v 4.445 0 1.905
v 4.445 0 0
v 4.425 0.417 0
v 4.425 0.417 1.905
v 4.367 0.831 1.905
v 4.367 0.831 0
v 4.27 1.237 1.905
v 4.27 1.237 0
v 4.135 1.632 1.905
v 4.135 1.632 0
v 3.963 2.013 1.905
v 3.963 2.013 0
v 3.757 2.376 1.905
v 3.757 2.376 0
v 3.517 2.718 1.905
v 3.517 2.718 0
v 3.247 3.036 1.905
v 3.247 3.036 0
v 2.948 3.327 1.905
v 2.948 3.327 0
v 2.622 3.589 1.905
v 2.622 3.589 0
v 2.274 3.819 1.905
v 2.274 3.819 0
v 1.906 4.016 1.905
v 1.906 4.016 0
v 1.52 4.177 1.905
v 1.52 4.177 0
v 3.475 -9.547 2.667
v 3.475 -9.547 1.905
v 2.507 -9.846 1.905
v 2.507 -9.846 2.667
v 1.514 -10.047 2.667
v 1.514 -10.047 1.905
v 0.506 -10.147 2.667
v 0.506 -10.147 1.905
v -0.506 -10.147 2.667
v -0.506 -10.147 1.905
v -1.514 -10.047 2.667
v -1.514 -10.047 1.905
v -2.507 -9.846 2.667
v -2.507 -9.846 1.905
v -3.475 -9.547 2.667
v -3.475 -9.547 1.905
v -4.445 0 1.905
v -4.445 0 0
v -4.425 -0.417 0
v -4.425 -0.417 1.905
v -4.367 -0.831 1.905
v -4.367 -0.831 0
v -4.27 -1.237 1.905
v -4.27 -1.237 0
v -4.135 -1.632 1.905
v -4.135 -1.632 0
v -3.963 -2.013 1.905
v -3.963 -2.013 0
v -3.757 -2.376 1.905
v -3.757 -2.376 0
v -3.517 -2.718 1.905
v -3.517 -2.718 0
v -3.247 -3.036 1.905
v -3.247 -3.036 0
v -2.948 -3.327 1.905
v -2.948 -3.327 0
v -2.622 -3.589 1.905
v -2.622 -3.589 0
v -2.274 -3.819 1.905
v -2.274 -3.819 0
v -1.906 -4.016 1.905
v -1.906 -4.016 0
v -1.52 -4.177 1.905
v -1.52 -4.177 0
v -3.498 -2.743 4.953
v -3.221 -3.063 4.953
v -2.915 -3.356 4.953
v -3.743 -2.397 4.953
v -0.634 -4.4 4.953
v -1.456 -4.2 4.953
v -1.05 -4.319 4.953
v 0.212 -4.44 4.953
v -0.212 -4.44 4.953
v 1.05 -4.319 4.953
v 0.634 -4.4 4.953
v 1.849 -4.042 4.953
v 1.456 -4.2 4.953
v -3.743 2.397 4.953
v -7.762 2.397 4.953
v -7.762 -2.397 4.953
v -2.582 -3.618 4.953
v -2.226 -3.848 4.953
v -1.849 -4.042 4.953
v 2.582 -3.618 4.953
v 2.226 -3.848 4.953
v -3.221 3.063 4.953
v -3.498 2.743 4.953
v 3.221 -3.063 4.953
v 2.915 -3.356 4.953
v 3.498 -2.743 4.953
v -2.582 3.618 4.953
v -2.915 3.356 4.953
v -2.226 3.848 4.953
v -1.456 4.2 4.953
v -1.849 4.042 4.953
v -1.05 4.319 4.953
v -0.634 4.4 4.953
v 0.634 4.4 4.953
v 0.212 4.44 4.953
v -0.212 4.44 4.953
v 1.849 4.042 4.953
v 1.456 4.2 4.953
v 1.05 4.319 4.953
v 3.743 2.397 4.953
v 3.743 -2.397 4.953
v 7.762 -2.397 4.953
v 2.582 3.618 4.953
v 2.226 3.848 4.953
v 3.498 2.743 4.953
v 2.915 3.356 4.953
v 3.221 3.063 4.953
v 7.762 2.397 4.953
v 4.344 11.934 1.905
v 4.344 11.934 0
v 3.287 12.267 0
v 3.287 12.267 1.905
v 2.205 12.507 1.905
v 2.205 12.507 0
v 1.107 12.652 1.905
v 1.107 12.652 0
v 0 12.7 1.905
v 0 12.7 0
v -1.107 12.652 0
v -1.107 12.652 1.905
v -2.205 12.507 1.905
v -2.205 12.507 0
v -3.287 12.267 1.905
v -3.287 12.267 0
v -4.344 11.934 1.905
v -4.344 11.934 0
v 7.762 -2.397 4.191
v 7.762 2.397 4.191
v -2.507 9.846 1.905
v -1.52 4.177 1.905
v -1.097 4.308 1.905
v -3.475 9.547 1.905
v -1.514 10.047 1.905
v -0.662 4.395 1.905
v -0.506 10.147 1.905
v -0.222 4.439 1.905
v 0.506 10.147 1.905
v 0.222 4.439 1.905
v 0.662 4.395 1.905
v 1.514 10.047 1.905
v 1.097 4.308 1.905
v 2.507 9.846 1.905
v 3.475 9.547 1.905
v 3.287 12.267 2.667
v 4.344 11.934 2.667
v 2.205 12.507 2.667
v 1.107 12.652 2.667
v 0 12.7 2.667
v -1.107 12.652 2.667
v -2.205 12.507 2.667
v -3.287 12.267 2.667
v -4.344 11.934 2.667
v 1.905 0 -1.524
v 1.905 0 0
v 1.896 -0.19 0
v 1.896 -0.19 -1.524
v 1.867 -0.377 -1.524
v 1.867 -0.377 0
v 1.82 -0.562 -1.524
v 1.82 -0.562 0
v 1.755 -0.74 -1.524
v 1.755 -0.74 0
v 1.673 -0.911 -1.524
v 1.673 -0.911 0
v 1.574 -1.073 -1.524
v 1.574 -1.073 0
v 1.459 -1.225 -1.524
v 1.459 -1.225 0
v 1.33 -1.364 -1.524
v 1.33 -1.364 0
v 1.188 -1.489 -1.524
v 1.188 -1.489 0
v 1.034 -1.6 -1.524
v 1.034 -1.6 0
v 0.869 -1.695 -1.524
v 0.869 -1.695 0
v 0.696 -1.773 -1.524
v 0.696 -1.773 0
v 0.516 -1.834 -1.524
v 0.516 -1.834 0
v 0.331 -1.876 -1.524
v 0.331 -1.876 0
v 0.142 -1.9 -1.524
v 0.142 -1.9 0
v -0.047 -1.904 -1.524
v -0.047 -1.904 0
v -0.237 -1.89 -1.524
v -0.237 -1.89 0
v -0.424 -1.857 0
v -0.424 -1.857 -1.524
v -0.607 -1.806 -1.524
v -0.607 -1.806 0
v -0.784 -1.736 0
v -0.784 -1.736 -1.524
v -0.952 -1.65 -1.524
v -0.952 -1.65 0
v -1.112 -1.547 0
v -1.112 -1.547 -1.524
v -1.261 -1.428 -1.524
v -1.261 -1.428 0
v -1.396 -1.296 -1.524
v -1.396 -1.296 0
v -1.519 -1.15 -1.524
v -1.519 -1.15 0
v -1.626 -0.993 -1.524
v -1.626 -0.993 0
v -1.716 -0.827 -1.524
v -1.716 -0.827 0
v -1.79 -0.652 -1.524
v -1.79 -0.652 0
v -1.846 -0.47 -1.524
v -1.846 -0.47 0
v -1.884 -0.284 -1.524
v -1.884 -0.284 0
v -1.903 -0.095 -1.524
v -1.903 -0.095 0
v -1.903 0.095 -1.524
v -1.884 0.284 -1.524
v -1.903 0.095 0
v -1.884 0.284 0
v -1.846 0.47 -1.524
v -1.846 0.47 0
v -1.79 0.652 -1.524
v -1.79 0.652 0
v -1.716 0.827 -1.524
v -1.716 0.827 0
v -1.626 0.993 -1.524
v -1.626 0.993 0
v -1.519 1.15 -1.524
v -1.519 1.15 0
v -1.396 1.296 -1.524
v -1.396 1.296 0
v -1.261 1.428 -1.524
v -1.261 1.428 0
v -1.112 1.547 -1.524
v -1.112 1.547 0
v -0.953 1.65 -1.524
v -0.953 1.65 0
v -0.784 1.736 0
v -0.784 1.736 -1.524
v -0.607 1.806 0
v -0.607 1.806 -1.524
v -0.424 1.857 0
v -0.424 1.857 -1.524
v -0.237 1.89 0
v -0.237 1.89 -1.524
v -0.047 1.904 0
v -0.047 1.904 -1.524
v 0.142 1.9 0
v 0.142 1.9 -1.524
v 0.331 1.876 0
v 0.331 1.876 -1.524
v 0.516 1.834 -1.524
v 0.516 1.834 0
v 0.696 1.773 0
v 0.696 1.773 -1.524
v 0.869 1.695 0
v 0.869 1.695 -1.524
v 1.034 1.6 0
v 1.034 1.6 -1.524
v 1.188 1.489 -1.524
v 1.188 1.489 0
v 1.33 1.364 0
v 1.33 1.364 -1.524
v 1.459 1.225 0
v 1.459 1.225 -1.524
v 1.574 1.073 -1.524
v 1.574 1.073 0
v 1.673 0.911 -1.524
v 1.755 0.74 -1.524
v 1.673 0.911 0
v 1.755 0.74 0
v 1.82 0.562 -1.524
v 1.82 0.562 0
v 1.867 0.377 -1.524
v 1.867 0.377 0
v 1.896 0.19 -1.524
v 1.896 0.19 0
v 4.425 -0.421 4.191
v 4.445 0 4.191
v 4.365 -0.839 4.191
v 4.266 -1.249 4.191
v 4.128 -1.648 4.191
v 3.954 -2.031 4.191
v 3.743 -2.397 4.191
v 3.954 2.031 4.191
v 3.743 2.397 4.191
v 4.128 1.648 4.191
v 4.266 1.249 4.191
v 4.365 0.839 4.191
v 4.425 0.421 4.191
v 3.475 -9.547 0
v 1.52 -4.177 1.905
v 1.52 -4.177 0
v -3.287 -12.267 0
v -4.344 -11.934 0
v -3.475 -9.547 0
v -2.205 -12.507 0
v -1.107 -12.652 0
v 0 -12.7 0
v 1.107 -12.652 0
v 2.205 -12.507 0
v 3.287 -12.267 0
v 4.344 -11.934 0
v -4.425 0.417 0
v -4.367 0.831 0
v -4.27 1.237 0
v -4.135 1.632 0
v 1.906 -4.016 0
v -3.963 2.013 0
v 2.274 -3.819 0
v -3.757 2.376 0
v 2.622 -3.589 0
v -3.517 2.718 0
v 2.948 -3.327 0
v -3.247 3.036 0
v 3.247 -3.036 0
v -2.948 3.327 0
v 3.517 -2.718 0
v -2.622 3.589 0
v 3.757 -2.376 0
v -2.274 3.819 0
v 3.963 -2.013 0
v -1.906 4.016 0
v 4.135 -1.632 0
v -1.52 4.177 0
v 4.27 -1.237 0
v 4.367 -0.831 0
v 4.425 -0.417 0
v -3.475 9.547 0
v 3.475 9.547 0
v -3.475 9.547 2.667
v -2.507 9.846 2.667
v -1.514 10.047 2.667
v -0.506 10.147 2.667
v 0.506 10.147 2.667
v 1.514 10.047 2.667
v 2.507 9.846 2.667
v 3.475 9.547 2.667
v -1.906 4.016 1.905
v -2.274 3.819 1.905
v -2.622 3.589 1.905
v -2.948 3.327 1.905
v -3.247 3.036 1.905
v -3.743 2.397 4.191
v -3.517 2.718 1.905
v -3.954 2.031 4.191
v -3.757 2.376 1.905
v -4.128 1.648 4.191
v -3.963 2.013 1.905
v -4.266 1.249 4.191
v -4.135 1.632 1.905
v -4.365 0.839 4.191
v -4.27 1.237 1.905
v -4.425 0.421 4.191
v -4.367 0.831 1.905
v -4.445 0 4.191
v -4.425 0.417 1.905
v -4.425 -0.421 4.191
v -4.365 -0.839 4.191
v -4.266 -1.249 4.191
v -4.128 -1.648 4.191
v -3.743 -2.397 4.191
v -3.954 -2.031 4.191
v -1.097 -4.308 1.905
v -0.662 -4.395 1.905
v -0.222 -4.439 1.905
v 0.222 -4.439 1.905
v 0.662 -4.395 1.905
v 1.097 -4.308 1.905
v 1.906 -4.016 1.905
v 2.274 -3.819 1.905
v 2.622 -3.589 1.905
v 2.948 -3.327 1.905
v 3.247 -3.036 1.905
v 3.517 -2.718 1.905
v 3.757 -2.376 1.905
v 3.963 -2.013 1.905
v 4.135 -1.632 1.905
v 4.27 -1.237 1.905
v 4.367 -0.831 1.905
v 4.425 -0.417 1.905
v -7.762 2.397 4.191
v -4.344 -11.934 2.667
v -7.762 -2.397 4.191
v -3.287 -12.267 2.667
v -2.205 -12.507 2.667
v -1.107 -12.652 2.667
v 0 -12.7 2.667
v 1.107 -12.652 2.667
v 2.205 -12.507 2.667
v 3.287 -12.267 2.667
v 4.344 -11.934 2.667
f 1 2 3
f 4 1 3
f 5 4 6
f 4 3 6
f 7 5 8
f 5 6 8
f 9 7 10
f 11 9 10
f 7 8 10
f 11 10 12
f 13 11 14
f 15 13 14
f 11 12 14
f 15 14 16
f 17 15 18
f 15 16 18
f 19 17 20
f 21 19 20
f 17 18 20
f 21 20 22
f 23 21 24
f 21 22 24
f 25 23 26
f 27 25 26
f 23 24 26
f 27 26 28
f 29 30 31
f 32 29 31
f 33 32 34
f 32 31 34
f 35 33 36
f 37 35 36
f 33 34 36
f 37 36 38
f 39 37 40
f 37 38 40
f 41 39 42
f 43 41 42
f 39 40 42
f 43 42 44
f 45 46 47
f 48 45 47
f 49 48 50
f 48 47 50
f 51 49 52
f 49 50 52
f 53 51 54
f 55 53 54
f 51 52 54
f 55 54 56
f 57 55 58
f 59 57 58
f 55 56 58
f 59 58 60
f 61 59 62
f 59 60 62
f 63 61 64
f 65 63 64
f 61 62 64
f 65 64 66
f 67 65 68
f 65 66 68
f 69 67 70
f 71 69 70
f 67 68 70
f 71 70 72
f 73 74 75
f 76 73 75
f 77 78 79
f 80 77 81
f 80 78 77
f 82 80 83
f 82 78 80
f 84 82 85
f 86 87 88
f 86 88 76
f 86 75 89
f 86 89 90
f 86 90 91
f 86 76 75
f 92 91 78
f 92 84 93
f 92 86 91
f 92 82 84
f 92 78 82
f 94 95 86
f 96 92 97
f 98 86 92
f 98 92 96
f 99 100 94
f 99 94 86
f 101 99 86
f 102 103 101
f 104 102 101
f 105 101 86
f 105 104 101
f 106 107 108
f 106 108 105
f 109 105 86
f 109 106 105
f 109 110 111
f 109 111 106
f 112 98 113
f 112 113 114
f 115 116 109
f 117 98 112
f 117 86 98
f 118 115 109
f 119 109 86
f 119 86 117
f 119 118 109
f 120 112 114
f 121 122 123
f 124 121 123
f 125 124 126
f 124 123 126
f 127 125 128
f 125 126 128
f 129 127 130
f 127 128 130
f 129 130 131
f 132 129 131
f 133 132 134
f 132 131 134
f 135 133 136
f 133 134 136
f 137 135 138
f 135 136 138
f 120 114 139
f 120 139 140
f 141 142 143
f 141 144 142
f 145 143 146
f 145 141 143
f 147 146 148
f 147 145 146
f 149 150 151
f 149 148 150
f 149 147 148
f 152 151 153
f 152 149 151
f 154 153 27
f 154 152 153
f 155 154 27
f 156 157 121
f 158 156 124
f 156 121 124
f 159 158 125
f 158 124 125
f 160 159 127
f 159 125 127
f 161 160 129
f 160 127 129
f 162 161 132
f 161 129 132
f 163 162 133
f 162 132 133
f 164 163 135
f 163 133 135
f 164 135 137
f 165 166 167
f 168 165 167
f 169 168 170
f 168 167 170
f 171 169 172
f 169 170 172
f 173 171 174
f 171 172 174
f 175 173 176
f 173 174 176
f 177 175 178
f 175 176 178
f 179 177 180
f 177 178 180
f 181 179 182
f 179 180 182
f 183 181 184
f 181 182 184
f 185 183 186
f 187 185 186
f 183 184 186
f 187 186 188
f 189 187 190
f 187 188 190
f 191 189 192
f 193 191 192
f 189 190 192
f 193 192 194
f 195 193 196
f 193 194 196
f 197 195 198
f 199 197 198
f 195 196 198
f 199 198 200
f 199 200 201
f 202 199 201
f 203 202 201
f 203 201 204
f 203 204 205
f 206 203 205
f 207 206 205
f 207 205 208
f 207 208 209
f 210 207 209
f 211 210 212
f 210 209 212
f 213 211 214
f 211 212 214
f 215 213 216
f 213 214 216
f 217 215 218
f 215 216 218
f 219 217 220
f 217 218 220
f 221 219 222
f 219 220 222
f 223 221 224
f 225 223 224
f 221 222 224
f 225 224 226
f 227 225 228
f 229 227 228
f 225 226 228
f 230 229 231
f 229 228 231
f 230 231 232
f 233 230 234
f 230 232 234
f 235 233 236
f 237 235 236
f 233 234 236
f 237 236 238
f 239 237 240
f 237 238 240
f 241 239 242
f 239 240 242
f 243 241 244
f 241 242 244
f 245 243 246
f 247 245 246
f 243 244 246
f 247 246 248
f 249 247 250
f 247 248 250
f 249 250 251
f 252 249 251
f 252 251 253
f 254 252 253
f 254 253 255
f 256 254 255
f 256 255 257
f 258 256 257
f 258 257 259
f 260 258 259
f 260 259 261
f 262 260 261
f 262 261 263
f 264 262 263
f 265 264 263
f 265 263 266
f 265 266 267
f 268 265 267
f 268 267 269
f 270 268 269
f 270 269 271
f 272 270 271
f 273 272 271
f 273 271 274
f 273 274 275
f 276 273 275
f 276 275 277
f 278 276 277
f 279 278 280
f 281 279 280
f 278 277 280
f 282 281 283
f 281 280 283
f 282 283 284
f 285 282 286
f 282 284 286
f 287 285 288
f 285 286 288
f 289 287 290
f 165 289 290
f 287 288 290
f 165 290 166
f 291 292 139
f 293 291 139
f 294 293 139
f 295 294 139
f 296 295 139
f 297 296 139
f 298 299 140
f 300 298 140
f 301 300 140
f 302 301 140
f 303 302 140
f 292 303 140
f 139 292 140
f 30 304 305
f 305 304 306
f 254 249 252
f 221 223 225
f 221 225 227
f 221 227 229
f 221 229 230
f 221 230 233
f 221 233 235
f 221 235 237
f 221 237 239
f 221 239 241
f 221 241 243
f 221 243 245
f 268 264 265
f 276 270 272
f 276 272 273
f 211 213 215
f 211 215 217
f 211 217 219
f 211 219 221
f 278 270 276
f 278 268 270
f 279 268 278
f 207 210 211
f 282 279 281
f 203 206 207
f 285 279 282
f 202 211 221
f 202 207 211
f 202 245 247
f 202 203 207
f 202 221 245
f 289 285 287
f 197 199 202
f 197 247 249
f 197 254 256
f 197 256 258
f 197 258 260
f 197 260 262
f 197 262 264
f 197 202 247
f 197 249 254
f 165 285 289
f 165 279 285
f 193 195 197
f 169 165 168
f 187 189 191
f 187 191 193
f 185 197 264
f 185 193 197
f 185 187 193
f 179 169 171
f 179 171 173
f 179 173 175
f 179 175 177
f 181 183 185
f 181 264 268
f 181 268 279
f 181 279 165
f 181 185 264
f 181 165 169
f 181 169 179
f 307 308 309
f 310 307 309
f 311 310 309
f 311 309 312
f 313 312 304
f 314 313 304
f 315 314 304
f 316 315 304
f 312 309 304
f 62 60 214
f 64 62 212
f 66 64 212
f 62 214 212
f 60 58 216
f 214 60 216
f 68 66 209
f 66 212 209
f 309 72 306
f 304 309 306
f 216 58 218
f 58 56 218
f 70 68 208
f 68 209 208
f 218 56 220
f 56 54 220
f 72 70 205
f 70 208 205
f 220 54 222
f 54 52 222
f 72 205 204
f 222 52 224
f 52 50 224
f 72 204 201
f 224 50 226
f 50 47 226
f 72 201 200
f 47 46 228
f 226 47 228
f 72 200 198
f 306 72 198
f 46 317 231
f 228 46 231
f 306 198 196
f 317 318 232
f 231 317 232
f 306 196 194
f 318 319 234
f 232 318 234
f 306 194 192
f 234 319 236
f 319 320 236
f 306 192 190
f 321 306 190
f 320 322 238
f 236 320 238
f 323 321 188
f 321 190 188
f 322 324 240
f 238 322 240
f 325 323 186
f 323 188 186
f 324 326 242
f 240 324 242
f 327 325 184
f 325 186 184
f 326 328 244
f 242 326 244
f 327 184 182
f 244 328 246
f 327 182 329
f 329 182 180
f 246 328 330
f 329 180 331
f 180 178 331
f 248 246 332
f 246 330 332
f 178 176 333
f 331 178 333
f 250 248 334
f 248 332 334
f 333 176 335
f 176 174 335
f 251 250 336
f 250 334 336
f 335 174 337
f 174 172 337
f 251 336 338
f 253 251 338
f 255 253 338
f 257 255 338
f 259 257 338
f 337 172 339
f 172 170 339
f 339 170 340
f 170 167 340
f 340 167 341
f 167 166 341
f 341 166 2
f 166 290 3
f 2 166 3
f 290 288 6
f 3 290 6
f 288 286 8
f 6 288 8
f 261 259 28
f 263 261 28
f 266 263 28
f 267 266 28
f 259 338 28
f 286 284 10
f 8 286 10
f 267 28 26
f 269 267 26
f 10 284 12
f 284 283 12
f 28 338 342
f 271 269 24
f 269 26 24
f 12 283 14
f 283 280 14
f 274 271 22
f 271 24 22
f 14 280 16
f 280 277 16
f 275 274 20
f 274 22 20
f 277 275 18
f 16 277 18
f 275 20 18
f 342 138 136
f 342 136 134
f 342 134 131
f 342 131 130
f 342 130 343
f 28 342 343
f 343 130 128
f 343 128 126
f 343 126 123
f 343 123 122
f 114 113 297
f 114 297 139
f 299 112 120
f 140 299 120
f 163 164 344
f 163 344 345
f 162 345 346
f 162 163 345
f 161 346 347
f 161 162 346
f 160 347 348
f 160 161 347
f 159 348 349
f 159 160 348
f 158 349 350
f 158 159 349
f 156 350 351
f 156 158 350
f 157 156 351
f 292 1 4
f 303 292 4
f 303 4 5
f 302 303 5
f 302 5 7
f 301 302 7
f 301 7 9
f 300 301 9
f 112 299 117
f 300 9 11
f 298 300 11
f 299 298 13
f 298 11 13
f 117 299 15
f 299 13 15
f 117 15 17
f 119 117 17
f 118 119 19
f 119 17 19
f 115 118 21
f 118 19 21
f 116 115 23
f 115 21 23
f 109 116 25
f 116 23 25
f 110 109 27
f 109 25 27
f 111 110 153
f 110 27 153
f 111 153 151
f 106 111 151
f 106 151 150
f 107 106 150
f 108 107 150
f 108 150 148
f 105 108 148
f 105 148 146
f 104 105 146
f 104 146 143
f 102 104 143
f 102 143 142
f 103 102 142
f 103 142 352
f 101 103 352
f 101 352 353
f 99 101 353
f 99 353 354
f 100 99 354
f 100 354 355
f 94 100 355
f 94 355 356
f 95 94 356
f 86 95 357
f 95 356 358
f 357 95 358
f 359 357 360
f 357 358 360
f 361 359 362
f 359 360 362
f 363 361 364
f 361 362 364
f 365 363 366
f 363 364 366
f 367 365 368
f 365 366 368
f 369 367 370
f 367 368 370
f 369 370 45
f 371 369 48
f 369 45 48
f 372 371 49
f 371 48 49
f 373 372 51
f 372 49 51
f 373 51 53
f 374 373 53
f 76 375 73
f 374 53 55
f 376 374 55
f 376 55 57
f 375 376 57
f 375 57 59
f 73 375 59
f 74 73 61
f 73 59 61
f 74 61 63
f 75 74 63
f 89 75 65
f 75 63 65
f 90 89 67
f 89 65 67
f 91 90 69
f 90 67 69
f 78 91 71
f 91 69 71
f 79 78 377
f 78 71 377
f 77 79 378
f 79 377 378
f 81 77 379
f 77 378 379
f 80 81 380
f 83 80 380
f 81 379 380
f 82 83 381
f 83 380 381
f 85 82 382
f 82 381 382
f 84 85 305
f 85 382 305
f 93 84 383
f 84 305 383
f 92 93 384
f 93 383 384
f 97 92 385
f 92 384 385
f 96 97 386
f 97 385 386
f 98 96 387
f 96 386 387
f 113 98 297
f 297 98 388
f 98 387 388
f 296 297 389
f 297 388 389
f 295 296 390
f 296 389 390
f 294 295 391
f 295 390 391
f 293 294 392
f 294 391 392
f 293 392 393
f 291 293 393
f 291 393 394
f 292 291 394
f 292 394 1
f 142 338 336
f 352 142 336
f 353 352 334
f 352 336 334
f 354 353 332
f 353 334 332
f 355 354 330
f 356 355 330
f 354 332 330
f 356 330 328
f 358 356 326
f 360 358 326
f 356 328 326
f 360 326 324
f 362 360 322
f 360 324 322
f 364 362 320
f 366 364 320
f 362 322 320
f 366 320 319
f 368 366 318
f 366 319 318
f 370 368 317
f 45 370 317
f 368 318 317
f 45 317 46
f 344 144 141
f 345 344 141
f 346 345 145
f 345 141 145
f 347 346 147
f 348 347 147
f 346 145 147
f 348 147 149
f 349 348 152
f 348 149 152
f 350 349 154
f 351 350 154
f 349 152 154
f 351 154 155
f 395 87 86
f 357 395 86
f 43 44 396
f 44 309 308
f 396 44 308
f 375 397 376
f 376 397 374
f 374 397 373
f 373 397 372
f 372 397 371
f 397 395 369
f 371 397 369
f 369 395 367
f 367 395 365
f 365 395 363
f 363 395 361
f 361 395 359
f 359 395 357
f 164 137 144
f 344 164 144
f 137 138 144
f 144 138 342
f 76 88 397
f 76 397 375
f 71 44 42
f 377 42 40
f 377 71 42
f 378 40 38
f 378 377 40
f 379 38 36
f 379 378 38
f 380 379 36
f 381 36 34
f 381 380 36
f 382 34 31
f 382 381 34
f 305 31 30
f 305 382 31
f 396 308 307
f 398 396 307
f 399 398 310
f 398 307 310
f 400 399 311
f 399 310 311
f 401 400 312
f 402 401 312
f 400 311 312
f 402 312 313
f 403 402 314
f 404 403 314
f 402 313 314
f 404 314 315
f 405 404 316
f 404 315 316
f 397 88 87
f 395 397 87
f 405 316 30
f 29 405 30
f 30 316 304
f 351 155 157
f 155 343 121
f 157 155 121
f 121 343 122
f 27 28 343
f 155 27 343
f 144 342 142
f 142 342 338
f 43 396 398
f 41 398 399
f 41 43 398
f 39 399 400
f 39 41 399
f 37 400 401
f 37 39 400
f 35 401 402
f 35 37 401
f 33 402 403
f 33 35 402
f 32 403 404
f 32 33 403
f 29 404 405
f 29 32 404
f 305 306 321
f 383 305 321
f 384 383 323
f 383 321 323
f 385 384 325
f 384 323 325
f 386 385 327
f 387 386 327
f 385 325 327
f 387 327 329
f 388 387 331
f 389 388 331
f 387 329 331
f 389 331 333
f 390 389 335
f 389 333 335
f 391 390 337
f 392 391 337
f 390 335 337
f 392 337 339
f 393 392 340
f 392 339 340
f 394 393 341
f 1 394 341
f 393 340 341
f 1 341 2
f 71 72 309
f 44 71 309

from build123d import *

# Parameters (mm, degrees)
F1_DEPTH = 1.905
F3_DEPTH = 0.762
F4_R     = 4.445
F5_DEPTH = 3.048
F6_W     = 15.5236069113
F6_H     = 4.7940094955
F7_DEPTH = 0.762
F8_R     = 1.905
F9_DEPTH = 1.524


with BuildPart() as f1:
    # F0 (on Top) → F1 (new body)
    with BuildSketch(Plane.XY):
        with BuildLine():
            ThreePointArc((0, 10.16), (1.7642654851, 10.0056467706), (3.4749246562, 9.5472770272))
            Line((3.4749246562, 9.5472770272), (4.3436558202, 11.934096284))
            ThreePointArc((4.3436558202, 11.934096284), (2.2053318564, 12.5070584633), (0, 12.7))
            Line((0, 12.7), (0, 10.16))
        make_face()
        with BuildLine():
            ThreePointArc((-3.4749246562, 9.5472770272), (-1.7642654851, 10.0056467706), (0, 10.16))
            Line((0, 10.16), (0, 12.7))
            ThreePointArc((0, 12.7), (-2.2053318564, 12.5070584633), (-4.3436558202, 11.934096284))
            Line((-4.3436558202, 11.934096284), (-3.4749246562, 9.5472770272))
        make_face()
        with BuildLine():
            Line((4.3436558202, -11.934096284), (3.4749246562, -9.5472770272))
            ThreePointArc((3.4749246562, -9.5472770272), (0, -10.16), (-3.4749246562, -9.5472770272))
            Line((-3.4749246562, -9.5472770272), (-4.3436558202, -11.934096284))
            ThreePointArc((-4.3436558202, -11.934096284), (0, -12.7), (4.3436558202, -11.934096284))
        make_face()
        with BuildLine():
            Line((0, 0), (-1.5202795371, 4.1769336994))
            ThreePointArc((-1.5202795371, 4.1769336994), (-3.6411308369, 2.5495472596), (-4.445, 0))
            Line((-4.445, 0), (0, 0))
        make_face()
        with BuildLine():
            ThreePointArc((1.5202795371, -4.1769336994), (3.6411308369, -2.5495472596), (4.445, 0))
            ThreePointArc((4.445, 0), (3.6411308369, 2.5495472596), (1.5202795371, 4.1769336994))
            ThreePointArc((1.5202795371, 4.1769336994), (0.7718661497, 4.3774704621), (0, 4.445))
            Line((0, 4.445), (0, 0))
            Line((0, 0), (-4.445, 0))
            ThreePointArc((-4.445, 0), (-3.6411308369, -2.5495472596), (-1.5202795371, -4.1769336994))
            ThreePointArc((-1.5202795371, -4.1769336994), (0, -4.445), (1.5202795371, -4.1769336994))
        make_face()
        with BuildLine():
            Line((3.4749246562, -9.5472770272), (1.5202795371, -4.1769336994))
            ThreePointArc((1.5202795371, -4.1769336994), (0, -4.445), (-1.5202795371, -4.1769336994))
            Line((-1.5202795371, -4.1769336994), (-3.4749246562, -9.5472770272))
            ThreePointArc((-3.4749246562, -9.5472770272), (0, -10.16), (3.4749246562, -9.5472770272))
        make_face()
        with BuildLine():
            Line((0, 0), (0, 4.445))
            ThreePointArc((0, 4.445), (-0.7718661497, 4.3774704621), (-1.5202795371, 4.1769336994))
            Line((-1.5202795371, 4.1769336994), (0, 0))
        make_face()
        with BuildLine():
            ThreePointArc((-1.5202795371, 4.1769336994), (-0.7718661497, 4.3774704621), (0, 4.445))
            Line((0, 4.445), (0, 10.16))
            ThreePointArc((0, 10.16), (-1.7642654851, 10.0056467706), (-3.4749246562, 9.5472770272))
            Line((-3.4749246562, 9.5472770272), (-1.5202795371, 4.1769336994))
        make_face()
        with BuildLine():
            ThreePointArc((0, 4.445), (0.7718661497, 4.3774704621), (1.5202795371, 4.1769336994))
            Line((1.5202795371, 4.1769336994), (3.4749246562, 9.5472770272))
            ThreePointArc((3.4749246562, 9.5472770272), (1.7642654851, 10.0056467706), (0, 10.16))
            Line((0, 10.16), (0, 4.445))
        make_face()
    extrude(amount=F1_DEPTH)

    # F2 (on face) → F3 (join)
    with BuildSketch(Plane.XY.offset(1.905)):
        with BuildLine():
            Line((3.4749246562, 9.5472770272), (4.3436558202, 11.934096284))
            ThreePointArc((4.3436558202, 11.934096284), (0, 12.7), (-4.3436558202, 11.934096284))
            Line((-4.3436558202, 11.934096284), (-3.4749246562, 9.5472770272))
            ThreePointArc((-3.4749246562, 9.5472770272), (0, 10.16), (3.4749246562, 9.5472770272))
        make_face()
        with BuildLine():
            ThreePointArc((-4.3436558202, -11.934096284), (0, -12.7), (4.3436558202, -11.934096284))
            Line((4.3436558202, -11.934096284), (3.4749246562, -9.5472770272))
            ThreePointArc((3.4749246562, -9.5472770272), (0, -10.16), (-3.4749246562, -9.5472770272))
            Line((-3.4749246562, -9.5472770272), (-4.3436558202, -11.934096284))
        make_face()
    extrude(amount=F3_DEPTH)

    # F4 (on face) → F5 (join)
    with BuildSketch(Plane.XY.offset(1.905)):
        Circle(F4_R)
    extrude(amount=F5_DEPTH)

    # F6 (on face) → F7 (join)
    with BuildSketch(Plane.XY.offset(4.953)):
        Rectangle(F6_W, F6_H)
    extrude(amount=-F7_DEPTH)

    # F8 (on face) → F9 (join)
    with BuildSketch(Plane(origin=(0, 0, 0), x_dir=(1, 0, 0), z_dir=(0, 0, -1))):
        Circle(F8_R)
    extrude(amount=F9_DEPTH)


solid = f1.part
